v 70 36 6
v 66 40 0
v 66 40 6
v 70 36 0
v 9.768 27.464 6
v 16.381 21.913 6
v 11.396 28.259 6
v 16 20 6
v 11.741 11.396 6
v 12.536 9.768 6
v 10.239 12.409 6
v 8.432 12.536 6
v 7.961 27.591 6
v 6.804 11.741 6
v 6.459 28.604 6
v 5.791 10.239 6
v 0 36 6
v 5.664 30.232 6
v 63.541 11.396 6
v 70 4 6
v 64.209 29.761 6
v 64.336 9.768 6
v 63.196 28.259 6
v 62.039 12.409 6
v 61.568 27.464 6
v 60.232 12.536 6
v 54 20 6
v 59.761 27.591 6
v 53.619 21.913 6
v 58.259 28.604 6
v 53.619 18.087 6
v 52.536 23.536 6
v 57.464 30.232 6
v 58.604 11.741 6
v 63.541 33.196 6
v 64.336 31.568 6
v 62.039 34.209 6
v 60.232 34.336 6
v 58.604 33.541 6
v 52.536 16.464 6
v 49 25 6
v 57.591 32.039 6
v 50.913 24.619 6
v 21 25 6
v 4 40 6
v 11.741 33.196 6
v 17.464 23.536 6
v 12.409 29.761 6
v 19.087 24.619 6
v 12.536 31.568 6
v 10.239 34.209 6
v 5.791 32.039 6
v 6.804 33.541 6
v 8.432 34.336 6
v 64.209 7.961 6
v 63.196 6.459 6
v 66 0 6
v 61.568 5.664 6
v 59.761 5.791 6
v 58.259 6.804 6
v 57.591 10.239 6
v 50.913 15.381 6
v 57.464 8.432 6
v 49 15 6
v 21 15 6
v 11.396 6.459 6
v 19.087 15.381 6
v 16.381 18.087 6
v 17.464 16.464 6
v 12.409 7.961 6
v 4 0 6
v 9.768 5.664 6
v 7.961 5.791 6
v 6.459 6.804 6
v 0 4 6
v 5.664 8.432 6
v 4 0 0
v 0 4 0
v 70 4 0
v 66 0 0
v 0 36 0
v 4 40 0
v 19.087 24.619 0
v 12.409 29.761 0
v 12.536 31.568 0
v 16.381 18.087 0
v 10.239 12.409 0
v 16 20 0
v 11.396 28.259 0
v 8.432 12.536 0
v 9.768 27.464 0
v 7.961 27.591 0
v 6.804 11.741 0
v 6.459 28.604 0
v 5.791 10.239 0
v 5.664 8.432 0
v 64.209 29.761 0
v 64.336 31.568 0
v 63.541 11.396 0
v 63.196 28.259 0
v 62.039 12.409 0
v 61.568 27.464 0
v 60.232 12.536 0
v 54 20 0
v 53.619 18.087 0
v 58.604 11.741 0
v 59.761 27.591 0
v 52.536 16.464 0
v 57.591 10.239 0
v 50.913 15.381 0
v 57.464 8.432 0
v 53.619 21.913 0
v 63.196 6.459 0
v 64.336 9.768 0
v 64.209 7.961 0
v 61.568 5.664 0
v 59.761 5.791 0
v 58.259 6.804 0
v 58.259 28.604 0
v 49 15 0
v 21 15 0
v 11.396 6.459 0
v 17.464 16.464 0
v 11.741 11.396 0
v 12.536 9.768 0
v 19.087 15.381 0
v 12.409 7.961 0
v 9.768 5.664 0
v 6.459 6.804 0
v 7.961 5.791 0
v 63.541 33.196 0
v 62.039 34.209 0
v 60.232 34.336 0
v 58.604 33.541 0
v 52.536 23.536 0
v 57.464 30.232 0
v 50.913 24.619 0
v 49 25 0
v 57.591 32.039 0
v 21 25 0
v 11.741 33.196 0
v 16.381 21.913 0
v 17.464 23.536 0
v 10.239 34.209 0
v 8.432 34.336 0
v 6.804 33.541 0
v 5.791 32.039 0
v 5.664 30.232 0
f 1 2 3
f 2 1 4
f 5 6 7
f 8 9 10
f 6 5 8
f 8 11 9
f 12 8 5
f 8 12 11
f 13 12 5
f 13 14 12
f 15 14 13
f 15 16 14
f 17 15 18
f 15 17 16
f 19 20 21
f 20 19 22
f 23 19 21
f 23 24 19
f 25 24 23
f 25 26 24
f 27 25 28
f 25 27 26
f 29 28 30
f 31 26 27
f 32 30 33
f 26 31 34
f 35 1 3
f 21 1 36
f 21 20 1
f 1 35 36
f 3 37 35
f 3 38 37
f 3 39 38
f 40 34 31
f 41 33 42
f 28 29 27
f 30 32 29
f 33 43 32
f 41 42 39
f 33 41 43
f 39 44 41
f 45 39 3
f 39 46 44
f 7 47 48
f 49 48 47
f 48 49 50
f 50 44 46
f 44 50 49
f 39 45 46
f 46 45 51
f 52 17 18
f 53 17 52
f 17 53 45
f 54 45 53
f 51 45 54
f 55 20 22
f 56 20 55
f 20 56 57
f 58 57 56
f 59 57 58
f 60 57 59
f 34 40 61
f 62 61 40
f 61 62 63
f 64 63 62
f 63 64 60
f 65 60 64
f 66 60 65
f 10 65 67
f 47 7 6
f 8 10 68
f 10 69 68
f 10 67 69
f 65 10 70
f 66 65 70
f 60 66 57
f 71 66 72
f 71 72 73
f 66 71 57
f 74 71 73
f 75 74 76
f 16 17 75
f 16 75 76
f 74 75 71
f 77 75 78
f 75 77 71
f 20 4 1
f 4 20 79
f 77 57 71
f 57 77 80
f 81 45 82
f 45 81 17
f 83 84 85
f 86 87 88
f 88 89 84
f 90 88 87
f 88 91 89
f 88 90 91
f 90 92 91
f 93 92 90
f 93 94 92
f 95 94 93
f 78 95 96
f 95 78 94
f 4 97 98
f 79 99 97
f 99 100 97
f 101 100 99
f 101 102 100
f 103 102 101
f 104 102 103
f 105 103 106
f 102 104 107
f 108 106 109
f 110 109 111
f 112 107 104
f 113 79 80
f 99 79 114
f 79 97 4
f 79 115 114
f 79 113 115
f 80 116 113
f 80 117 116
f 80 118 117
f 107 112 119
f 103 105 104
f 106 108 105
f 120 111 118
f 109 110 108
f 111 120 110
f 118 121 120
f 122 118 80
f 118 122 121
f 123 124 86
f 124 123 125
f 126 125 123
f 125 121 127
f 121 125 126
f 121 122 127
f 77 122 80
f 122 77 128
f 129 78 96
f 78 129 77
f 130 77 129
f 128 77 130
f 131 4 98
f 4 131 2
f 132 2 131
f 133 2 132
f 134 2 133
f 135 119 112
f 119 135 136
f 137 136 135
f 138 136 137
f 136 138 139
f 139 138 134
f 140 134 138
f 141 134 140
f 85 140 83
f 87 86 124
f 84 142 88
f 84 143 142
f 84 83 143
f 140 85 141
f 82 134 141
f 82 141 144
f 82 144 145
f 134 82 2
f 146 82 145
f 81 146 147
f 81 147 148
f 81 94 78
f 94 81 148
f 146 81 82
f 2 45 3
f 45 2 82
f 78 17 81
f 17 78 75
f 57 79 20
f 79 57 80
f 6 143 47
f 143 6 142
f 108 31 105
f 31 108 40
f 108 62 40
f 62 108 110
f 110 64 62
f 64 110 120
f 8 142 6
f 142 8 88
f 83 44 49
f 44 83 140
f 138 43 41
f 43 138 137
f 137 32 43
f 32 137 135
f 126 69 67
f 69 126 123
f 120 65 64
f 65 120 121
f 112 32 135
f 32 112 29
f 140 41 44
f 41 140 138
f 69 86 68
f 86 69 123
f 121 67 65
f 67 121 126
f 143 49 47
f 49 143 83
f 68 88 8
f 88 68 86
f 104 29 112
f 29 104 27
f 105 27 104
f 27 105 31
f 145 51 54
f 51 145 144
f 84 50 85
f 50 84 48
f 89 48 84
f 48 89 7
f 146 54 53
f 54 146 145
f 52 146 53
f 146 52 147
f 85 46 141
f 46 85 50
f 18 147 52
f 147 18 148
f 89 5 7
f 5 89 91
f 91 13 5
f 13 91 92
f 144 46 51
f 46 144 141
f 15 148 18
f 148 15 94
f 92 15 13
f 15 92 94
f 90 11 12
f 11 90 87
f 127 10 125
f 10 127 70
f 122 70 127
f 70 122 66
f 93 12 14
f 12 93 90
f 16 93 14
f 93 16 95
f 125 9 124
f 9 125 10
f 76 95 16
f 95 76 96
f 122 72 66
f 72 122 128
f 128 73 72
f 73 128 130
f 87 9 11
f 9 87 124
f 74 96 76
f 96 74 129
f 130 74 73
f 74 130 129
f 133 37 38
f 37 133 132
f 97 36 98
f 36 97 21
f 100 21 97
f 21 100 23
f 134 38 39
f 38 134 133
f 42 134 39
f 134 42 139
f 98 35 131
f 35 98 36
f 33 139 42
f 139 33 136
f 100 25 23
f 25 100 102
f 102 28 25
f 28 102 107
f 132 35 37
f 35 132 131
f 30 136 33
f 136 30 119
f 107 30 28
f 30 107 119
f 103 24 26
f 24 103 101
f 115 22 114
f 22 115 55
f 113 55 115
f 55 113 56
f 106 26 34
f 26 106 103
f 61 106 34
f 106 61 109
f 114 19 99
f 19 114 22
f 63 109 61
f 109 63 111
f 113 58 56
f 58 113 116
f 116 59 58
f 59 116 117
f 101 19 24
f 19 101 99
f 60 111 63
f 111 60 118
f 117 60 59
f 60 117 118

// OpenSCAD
$fn = 32;

// ----------------------------------------------------------------------
// Bracket plate: slot plate 70 x 40
// ----------------------------------------------------------------------

// --- parameters (mm) ---
hole_r = 3.5;             // bolt hole radius
plate_t = 6;              // plate thickness, Z (extrusion height)
plate_l = 70;             // plate length
plate_w = 40;             // plate width
slot_l = 28;              // slot straight length
slot_r = 5;               // slot end radius

slot_len = slot_l + 2 * slot_r;
slot_w = 2 * slot_r;
hole_d2 = 2 * hole_r;

profile = [[4, 0], [66, 0], [70, 4], [70, 36], [66, 40], [4, 40], [0, 36], [0, 4]];  // primary outline, 8 points, counter clockwise
void_1 = [[49, 15], [50.913, 15.381], [52.536, 16.464], [53.619, 18.087], [54, 20], [53.619, 21.913], [52.536, 23.536], [50.913, 24.619], [49, 25], [21, 25], [19.087, 24.619], [17.464, 23.536], [16.381, 21.913], [16, 20], [16.381, 18.087], [17.464, 16.464], [19.087, 15.381], [21, 15]];  // grip slot, 18 points
void_2 = [[12.536, 31.568], [11.741, 33.196], [10.239, 34.209], [8.432, 34.336], [6.804, 33.541], [5.791, 32.039], [5.664, 30.232], [6.459, 28.604], [7.961, 27.591], [9.768, 27.464], [11.396, 28.259], [12.409, 29.761]];  // corner hole, 12 points
void_3 = [[12.536, 9.768], [11.741, 11.396], [10.239, 12.409], [8.432, 12.536], [6.804, 11.741], [5.791, 10.239], [5.664, 8.432], [6.459, 6.804], [7.961, 5.791], [9.768, 5.664], [11.396, 6.459], [12.409, 7.961]];  // corner hole, 12 points
void_4 = [[64.336, 31.568], [63.541, 33.196], [62.039, 34.209], [60.232, 34.336], [58.604, 33.541], [57.591, 32.039], [57.464, 30.232], [58.259, 28.604], [59.761, 27.591], [61.568, 27.464], [63.196, 28.259], [64.209, 29.761]];  // corner hole, 12 points
void_5 = [[64.336, 9.768], [63.541, 11.396], [62.039, 12.409], [60.232, 12.536], [58.604, 11.741], [57.591, 10.239], [57.464, 8.432], [58.259, 6.804], [59.761, 5.791], [61.568, 5.664], [63.196, 6.459], [64.209, 7.961]];  // corner hole, 12 points

// --- the one profile operation ---
difference() {
  linear_extrude(height = plate_t) polygon(points = profile);
  translate([0, 0, -1])
    linear_extrude(height = plate_t + 2) polygon(points = void_1);
  translate([0, 0, -1])
    linear_extrude(height = plate_t + 2) polygon(points = void_2);
  translate([0, 0, -1])
    linear_extrude(height = plate_t + 2) polygon(points = void_3);
  translate([0, 0, -1])
    linear_extrude(height = plate_t + 2) polygon(points = void_4);
  translate([0, 0, -1])
    linear_extrude(height = plate_t + 2) polygon(points = void_5);
}
